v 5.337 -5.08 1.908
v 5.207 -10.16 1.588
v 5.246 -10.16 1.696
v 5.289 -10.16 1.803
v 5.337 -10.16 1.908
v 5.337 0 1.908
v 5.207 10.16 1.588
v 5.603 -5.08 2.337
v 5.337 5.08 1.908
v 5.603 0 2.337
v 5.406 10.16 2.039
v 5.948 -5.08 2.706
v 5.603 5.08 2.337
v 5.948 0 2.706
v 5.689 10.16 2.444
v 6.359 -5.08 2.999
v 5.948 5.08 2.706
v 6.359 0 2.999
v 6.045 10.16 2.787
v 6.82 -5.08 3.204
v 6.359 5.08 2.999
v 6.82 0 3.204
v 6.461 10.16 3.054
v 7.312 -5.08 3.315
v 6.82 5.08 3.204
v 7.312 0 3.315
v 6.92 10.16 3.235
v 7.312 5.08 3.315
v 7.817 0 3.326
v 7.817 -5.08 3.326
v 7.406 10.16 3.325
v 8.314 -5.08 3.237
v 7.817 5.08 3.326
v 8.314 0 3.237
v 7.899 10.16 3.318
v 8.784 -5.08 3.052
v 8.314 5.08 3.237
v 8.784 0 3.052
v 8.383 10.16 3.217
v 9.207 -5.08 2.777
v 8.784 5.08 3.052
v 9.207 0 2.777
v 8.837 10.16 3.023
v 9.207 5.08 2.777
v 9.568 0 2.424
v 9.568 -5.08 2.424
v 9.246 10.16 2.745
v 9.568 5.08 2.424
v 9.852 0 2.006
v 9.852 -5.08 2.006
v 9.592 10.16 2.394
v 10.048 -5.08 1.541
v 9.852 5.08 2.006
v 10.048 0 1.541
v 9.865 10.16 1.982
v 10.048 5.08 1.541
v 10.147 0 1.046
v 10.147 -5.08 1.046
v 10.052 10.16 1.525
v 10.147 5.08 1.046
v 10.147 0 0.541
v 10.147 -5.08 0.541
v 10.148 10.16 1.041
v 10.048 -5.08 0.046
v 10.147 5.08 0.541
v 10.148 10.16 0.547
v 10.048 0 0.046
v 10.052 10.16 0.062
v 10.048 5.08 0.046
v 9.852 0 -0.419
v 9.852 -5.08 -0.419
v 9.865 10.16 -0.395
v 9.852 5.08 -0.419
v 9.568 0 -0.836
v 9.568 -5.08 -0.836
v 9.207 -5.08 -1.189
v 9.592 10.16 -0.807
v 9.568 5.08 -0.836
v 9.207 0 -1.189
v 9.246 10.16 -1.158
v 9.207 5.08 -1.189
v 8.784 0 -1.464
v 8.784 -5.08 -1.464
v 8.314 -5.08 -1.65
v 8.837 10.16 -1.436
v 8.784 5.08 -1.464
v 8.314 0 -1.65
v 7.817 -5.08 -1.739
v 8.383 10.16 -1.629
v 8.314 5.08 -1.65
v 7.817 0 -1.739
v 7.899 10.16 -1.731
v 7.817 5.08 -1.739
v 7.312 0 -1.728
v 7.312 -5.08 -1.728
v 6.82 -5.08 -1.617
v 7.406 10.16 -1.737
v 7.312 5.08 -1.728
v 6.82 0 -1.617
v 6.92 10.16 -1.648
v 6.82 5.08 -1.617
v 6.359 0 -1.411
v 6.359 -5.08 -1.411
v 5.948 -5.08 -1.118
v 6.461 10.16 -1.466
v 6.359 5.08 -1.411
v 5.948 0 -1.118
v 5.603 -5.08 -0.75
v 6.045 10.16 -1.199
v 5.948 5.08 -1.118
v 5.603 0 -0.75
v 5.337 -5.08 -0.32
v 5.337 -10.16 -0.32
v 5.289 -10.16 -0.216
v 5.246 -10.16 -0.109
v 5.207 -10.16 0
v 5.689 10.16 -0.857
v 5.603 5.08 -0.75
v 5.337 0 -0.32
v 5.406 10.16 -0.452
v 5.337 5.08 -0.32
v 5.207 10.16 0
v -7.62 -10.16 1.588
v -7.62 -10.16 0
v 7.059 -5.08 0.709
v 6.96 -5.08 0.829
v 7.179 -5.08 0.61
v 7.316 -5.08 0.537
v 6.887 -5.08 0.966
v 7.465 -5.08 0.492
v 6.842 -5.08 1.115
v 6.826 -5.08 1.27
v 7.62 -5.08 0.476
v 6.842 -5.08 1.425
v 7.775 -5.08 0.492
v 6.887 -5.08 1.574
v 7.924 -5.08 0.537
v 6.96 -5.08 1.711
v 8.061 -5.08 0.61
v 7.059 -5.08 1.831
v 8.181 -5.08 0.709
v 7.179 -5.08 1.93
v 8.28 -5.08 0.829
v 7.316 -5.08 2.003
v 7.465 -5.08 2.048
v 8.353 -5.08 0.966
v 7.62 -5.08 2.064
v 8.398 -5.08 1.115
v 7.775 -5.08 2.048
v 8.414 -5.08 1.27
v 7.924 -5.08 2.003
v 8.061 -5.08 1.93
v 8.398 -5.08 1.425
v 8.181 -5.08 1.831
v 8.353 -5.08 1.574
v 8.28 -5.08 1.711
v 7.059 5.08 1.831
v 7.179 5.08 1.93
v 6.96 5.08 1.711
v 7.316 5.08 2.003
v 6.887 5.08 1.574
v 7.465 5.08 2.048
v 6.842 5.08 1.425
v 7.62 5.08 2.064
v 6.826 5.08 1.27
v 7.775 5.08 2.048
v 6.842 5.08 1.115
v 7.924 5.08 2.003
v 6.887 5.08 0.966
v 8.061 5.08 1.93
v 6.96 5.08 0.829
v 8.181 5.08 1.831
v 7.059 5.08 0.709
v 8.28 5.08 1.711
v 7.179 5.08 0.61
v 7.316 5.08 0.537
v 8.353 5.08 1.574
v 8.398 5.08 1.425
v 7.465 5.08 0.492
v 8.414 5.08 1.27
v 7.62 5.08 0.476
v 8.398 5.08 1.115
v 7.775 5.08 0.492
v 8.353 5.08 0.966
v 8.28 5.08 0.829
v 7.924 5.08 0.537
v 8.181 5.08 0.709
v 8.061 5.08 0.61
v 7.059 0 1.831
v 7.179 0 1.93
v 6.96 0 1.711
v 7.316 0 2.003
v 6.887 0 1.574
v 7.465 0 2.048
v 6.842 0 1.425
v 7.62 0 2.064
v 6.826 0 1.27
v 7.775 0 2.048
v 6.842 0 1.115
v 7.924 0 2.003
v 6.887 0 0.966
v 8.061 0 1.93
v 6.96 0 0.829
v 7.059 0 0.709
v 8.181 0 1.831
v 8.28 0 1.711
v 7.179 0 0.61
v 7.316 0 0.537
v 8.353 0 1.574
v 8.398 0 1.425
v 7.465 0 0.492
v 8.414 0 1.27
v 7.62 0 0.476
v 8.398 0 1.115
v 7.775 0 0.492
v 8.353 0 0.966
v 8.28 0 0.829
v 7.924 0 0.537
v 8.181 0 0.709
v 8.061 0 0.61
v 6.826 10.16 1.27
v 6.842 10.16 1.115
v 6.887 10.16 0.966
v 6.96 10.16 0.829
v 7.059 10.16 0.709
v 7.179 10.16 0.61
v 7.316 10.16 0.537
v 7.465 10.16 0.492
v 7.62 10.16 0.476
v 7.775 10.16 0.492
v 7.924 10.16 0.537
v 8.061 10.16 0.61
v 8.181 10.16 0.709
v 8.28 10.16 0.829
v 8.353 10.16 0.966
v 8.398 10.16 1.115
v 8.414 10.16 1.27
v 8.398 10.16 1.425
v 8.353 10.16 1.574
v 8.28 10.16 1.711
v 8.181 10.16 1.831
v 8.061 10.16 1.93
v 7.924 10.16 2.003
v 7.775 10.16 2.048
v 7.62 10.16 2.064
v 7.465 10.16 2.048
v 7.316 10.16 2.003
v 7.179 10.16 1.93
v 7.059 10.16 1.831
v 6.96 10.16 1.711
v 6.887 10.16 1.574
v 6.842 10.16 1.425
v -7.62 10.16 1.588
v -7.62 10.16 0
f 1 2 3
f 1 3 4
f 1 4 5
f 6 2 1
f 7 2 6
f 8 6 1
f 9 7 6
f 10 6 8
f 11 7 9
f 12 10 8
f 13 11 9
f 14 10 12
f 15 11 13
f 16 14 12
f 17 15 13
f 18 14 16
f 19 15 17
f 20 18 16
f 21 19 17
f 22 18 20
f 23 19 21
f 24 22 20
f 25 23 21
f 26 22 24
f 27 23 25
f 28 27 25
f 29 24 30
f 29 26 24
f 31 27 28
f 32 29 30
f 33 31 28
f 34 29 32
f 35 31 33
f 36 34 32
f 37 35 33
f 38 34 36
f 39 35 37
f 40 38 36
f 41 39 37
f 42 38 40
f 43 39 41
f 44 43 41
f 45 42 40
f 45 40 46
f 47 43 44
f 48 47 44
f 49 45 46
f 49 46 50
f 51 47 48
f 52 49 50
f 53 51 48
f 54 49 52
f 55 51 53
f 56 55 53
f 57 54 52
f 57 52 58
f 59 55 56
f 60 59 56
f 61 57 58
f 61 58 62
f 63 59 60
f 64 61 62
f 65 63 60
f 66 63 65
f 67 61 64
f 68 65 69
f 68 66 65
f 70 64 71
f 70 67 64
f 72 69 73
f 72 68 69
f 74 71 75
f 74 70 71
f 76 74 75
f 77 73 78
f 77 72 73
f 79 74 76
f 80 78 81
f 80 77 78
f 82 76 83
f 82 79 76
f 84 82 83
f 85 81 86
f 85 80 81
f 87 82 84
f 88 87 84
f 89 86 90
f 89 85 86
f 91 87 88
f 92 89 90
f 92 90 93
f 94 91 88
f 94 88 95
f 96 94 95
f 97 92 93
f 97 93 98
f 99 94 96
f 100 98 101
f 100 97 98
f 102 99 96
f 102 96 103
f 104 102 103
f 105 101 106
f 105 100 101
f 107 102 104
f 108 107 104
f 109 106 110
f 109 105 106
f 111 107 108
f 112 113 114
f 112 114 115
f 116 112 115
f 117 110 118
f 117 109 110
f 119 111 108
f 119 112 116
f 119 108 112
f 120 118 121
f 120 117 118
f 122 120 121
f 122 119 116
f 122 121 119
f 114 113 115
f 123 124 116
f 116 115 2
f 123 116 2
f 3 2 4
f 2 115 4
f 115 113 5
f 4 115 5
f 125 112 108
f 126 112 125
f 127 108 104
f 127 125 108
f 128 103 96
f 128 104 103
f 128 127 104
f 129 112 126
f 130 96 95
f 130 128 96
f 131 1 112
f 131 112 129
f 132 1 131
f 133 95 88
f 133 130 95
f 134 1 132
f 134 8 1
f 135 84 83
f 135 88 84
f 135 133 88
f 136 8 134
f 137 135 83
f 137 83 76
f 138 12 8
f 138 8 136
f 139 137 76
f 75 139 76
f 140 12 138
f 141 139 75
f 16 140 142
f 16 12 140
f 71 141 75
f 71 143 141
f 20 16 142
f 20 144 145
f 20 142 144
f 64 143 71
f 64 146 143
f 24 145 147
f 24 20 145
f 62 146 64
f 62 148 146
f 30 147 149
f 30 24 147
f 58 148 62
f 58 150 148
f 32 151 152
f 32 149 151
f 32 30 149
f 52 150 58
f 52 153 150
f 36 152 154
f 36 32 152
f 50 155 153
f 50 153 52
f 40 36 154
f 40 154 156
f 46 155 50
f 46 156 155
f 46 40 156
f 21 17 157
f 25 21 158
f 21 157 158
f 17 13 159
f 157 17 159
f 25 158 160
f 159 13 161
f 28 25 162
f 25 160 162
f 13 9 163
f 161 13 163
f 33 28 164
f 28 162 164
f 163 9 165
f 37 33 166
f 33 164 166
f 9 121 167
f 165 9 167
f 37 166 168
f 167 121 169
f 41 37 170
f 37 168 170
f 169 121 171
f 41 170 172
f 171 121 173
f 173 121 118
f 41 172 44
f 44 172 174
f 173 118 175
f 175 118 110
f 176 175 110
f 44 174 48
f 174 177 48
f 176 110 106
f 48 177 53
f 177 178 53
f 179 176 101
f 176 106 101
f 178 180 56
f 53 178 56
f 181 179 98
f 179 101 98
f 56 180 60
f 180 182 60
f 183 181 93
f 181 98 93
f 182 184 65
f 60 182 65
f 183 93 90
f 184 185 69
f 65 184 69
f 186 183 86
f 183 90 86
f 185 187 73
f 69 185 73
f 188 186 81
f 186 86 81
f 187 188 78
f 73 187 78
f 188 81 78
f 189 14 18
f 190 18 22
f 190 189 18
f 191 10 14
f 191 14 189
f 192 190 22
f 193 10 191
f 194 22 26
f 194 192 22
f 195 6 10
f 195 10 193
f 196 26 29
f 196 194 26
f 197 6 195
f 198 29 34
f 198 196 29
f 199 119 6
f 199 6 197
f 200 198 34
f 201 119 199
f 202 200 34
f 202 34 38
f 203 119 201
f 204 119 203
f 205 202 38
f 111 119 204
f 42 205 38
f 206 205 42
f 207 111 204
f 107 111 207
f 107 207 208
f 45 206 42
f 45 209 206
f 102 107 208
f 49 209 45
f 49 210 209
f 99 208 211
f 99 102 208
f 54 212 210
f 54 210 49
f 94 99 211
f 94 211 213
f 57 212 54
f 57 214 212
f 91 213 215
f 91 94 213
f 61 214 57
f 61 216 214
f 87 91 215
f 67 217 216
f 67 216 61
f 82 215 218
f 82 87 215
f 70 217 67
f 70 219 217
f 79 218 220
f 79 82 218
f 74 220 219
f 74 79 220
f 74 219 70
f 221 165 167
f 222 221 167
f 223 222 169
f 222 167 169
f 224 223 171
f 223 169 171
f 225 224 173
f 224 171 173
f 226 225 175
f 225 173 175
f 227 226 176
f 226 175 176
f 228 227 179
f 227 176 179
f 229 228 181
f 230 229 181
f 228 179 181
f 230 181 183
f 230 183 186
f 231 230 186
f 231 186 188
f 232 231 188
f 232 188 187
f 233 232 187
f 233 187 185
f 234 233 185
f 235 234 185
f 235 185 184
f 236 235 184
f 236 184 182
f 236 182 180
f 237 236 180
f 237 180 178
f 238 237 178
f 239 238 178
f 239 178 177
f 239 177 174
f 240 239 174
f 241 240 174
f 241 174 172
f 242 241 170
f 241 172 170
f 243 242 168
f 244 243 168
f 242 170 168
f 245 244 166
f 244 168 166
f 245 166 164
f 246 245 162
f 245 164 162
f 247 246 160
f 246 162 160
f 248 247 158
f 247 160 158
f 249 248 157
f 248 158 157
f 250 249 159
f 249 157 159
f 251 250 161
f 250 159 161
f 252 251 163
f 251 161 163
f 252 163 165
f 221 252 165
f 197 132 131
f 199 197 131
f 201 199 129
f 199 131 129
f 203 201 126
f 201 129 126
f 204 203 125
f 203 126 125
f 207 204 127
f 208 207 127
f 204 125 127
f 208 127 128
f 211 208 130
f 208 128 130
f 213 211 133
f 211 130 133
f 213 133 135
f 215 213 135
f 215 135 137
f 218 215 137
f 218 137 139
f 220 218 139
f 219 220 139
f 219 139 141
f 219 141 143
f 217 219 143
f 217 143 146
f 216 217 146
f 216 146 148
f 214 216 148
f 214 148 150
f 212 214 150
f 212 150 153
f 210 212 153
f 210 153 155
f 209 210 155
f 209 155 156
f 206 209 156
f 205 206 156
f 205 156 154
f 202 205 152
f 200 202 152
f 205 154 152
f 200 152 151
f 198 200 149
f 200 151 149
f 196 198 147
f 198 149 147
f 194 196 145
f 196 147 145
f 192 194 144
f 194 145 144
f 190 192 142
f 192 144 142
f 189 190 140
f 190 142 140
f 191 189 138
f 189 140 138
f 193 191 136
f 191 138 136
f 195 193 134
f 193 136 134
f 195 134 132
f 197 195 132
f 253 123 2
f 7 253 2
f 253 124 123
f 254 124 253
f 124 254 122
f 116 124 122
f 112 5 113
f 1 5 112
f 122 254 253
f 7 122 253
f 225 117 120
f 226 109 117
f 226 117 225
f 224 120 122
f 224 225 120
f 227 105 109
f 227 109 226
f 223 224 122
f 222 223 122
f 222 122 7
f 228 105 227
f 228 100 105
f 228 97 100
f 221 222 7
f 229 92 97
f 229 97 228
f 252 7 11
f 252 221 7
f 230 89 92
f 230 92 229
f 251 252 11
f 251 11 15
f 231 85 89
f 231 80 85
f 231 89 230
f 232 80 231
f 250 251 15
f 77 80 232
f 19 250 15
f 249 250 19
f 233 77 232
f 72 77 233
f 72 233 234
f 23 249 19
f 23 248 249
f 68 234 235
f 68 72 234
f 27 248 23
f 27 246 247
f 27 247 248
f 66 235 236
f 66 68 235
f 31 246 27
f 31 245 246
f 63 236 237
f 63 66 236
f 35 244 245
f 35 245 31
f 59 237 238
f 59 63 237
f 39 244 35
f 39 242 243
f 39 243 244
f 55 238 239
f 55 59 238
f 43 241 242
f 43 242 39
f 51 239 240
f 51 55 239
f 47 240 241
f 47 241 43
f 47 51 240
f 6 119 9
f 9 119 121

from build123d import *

# Parameters (mm, degrees)
SKETCH1_W                      = 15.24
SKETCH1_H                      = 20.32
BOSS_EXTRUDE1_DEPTH            = 1.5875
SKETCH2_W                      = 2.54
SKETCH2_H                      = 20.32
F_1_16_0_0625_DIAMETER_HOLE1_D = 1.5875
SKETCH10_W                     = 5.245479694
SKETCH10_H                     = 5.08
CUT_EXTRUDE1_DEPTH             = 6.35


with BuildPart() as part:
    # Sketch1 → Boss-Extrude1 (new body)
    with BuildSketch(Plane.XY):
        Rectangle(SKETCH1_W, SKETCH1_H)
    extrude(amount=BOSS_EXTRUDE1_DEPTH)

    # Sketch2 → Revolve-Thin1 (revolve)
    with BuildSketch(Plane(origin=(7.62, 0, 0), x_dir=(0, 0, -1), z_dir=(1, 0, 0))):
        with Locations((-2.06375, 0)):
            Rectangle(SKETCH2_W, SKETCH2_H)
    revolve(axis=Axis((7.62, -10.16, 0.79375), (0, 1, 0)))

    # 1/16 (0.0625) Diameter Hole1 (through all)
    with Locations(Plane(origin=(0, 10.16, 0), x_dir=(1, 0, 0), z_dir=(0, 1, 0))):
        with Locations((7.62, -1.27)):
            Hole(F_1_16_0_0625_DIAMETER_HOLE1_D / 2)

    # Sketch10 → Cut-Extrude1 (cut, symmetric)
    with BuildSketch(Plane.XY.offset(1.5875)):
        with Locations((7.960094746, 2.54)):
            Rectangle(SKETCH10_W, SKETCH10_H)
        with Locations((7.960094746, -7.62)):
            Rectangle(SKETCH10_W, SKETCH10_H)
    extrude(amount=CUT_EXTRUDE1_DEPTH, both=True, mode=Mode.SUBTRACT)


solid = part.part
